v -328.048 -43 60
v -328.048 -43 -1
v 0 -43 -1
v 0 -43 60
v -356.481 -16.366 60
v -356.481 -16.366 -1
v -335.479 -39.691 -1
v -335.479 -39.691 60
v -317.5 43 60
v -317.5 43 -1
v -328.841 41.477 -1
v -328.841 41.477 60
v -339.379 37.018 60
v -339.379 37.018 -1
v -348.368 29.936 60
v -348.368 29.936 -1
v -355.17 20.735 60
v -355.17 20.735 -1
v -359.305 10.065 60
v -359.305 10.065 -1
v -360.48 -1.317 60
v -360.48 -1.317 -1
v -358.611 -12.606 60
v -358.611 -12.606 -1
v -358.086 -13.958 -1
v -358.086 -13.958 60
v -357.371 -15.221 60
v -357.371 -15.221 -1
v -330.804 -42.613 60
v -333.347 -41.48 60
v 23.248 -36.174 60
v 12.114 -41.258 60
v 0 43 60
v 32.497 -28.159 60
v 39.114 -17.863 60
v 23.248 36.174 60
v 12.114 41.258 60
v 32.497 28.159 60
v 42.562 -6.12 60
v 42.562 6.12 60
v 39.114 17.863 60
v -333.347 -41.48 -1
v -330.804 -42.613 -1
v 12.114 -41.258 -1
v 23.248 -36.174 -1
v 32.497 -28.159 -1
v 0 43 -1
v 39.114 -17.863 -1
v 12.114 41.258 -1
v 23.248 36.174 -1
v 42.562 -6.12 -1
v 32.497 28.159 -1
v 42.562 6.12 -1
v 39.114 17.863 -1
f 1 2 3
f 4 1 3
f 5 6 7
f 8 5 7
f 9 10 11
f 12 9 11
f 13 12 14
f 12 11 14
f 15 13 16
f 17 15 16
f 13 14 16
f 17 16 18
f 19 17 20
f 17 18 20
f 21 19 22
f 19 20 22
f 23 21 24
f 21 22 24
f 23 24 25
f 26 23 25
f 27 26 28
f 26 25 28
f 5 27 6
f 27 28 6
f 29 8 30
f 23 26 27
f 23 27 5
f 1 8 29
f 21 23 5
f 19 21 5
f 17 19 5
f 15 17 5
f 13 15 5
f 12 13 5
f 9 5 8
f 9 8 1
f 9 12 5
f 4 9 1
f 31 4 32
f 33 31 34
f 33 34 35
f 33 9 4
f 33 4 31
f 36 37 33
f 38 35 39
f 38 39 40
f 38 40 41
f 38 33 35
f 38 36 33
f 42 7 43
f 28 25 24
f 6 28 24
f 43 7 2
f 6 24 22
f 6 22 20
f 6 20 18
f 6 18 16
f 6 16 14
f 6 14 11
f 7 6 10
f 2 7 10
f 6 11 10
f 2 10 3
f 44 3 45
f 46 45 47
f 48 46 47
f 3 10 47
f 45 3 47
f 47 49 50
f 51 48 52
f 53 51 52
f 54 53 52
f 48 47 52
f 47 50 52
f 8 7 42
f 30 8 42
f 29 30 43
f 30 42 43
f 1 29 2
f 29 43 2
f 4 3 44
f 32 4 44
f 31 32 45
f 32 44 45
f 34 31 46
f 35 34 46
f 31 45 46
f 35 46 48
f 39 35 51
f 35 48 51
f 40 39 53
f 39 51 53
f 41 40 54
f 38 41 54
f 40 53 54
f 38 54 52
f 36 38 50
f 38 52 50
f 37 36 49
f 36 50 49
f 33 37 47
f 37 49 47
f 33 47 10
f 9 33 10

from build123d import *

# Parameters (mm, degrees)
EXTRUSION1_DEPTH      = 60
EXTRUSION1_DEPTH_BACK = 1


with BuildPart() as part:
    # Esquisse1 → Extrusion1 (new, two sides: drawn at the far end of the back side and taken through both)
    with BuildSketch(Plane.XY.offset(-EXTRUSION1_DEPTH_BACK)):
        with BuildLine():
            Line((-356.481440216, -16.365912372), (-335.479161402, -39.691306064))
            ThreePointArc((-335.479161402, -39.691306064), (-332.115079578, -42.135454576), (-328.047713147, -43))
            Line((-328.047713147, -43), (0, -43))
            ThreePointArc((0, -43), (43, 0), (0, 43))
            Line((0, 43), (-317.5, 43))
            ThreePointArc((-317.5, 43), (-352.076517488, 25.562950503), (-358.610595586, -12.60630519))
            ThreePointArc((-358.610595586, -12.60630519), (-357.751492884, -14.602474173), (-356.481440216, -16.365912372))
        make_face()
    extrude(amount=EXTRUSION1_DEPTH + EXTRUSION1_DEPTH_BACK)


solid = part.part
